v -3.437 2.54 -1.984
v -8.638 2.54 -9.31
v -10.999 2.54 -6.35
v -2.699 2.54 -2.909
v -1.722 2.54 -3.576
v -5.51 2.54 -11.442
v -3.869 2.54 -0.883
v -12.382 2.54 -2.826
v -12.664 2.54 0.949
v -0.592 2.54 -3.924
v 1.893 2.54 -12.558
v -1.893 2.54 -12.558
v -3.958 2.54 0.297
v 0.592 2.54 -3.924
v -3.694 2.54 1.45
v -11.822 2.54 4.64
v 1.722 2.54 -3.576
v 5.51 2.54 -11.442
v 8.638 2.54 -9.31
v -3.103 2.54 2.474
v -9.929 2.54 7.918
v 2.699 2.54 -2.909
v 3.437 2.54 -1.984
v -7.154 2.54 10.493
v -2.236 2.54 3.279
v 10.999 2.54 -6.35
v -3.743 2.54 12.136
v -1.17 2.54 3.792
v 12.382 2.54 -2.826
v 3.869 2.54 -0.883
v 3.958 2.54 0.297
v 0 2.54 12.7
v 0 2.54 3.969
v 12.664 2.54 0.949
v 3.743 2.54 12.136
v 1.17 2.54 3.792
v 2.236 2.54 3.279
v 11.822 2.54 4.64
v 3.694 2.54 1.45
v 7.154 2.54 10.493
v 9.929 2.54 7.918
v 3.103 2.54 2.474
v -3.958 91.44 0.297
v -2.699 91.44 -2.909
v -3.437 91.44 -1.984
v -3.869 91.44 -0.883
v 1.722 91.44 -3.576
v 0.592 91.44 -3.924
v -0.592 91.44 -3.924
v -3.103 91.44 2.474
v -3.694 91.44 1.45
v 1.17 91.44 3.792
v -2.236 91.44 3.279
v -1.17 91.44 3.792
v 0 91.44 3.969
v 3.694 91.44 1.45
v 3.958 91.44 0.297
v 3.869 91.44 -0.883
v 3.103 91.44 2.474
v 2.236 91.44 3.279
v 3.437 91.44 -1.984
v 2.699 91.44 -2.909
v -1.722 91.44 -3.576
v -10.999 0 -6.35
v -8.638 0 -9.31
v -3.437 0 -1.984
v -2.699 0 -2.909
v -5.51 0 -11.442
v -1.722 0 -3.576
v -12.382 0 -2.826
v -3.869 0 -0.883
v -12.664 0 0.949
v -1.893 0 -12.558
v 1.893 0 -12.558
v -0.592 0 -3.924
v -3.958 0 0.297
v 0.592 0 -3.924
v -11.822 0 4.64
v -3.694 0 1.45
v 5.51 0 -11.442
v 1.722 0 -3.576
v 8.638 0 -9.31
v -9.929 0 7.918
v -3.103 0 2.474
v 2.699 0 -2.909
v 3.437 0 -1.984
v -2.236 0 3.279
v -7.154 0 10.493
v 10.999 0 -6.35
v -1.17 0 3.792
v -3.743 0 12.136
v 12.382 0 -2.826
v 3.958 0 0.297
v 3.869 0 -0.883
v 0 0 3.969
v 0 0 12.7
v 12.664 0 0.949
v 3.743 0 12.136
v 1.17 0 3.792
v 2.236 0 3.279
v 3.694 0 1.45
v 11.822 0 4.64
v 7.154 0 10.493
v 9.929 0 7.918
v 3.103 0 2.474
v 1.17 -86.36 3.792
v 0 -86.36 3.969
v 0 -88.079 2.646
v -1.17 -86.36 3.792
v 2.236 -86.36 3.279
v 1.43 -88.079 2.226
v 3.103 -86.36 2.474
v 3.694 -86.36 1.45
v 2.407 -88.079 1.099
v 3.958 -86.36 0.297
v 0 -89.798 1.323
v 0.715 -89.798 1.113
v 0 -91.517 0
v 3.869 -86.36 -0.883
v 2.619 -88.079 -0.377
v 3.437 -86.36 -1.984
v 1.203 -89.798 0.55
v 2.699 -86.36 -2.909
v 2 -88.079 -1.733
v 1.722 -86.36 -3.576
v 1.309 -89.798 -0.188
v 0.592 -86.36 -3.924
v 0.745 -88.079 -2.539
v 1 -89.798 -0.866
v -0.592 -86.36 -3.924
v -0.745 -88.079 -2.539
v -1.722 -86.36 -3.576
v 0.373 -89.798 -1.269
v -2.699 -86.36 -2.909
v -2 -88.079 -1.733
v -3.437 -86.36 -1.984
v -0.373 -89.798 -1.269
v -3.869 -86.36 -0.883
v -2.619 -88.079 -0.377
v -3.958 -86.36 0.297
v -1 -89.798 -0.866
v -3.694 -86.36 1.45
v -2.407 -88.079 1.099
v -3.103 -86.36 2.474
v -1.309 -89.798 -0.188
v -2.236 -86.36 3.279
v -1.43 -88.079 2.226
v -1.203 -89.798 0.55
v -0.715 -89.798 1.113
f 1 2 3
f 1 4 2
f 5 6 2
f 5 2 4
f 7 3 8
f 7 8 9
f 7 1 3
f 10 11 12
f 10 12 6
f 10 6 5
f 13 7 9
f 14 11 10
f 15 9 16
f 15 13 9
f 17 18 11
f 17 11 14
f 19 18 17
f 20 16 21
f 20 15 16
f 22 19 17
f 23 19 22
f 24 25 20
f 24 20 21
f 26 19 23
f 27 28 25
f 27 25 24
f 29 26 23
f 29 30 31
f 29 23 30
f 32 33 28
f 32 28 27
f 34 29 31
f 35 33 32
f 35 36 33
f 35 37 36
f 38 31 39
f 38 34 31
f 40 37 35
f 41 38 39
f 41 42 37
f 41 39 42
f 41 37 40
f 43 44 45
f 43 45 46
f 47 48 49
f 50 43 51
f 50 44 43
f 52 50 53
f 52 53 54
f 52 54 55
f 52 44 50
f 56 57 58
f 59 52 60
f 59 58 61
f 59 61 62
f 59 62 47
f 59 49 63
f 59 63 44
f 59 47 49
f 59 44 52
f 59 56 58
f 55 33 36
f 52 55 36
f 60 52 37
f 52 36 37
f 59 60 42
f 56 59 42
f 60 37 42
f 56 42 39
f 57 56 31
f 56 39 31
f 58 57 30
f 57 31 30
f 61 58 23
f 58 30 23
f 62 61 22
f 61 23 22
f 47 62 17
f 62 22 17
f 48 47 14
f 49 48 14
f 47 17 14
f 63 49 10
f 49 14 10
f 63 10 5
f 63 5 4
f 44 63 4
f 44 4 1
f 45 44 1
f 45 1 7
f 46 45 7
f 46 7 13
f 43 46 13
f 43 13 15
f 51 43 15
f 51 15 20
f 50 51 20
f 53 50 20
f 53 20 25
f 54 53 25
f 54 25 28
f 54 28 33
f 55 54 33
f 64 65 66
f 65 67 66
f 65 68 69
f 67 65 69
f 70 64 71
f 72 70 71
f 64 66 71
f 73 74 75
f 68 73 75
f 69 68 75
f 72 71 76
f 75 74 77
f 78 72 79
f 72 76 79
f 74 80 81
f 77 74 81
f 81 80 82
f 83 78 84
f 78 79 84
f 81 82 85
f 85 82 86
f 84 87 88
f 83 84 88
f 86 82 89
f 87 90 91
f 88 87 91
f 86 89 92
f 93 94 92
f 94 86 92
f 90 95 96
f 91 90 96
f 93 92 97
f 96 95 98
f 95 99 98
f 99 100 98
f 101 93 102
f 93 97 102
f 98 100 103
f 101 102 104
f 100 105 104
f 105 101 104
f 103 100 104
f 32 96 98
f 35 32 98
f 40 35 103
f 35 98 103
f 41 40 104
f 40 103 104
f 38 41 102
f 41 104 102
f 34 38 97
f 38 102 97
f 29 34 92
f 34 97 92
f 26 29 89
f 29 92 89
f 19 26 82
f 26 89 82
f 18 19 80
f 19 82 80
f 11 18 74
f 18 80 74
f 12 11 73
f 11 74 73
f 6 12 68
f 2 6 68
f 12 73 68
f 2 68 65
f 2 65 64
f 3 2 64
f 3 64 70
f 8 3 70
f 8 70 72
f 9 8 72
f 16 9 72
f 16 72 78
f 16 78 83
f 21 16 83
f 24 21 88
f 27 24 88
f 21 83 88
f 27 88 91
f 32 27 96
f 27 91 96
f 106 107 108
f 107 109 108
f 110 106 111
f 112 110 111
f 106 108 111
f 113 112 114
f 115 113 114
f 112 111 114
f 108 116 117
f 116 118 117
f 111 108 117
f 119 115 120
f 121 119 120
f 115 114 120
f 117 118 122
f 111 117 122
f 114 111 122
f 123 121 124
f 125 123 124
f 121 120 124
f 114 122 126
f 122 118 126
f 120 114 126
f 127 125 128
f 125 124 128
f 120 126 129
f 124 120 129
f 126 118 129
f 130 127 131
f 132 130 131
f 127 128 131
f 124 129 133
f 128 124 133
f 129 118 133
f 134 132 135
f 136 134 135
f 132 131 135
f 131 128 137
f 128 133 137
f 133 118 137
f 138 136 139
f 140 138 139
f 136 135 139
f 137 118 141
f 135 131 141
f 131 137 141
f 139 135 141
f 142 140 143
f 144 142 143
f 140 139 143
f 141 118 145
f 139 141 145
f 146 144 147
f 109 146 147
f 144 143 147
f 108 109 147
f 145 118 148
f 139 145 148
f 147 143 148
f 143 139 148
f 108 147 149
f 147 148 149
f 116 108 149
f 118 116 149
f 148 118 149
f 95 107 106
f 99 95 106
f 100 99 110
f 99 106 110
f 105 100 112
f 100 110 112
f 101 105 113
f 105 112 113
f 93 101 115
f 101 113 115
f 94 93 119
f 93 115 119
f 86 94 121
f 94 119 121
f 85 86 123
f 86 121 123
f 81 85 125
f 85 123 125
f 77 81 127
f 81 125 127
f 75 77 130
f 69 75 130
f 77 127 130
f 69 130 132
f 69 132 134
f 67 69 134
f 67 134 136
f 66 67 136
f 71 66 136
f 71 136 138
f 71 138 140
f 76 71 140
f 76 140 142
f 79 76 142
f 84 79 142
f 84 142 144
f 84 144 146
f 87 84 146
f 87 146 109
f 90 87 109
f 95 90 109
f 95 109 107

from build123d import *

# Parameters (mm, degrees)
SKETCH1_R           = 12.7
SKETCH1_R_2         = 3.96875
BOSS_EXTRUDE1_DEPTH = 2.54
BOSS_EXTRUDE2_START = -88.9
SKETCH2_R           = 3.96875
BOSS_EXTRUDE2_DEPTH = 177.8


with BuildPart() as part:
    # Sketch1 → Boss-Extrude1 (new body)
    with BuildSketch(Plane(origin=(0, 0, 0), x_dir=(1, 0, 0), z_dir=(0, 1, 0))):
        with Locations(Location((0, 0, 0), (0, 0, 270))):
            Circle(SKETCH1_R)
        with Locations(Location((0, 0, 0), (0, 0, 270))):
            Circle(SKETCH1_R_2, mode=Mode.SUBTRACT)
    extrude(amount=BOSS_EXTRUDE1_DEPTH)

    # Sketch2 → Boss-Extrude2 (add)
    with BuildSketch(Plane(origin=(0, 2.54, 0), x_dir=(1, 0, 0), z_dir=(0, 1, 0)).offset(BOSS_EXTRUDE2_START)):
        with Locations(Location((0, 0, 0), (0, 0, 270))):
            Circle(SKETCH2_R)
    extrude(amount=BOSS_EXTRUDE2_DEPTH)

    # Sketch3 → Revolve1 (revolve)
    with BuildSketch(Plane(origin=(0, 0, 0), x_dir=(0, 0, -1), z_dir=(1, 0, 0))):
        Polygon((0, -86.36), (-3.96875, -86.36), (0, -91.517208385), align=None)
    revolve(axis=Axis((0, -87.920610372, 0), (0, 1, 0)))


solid = part.part
